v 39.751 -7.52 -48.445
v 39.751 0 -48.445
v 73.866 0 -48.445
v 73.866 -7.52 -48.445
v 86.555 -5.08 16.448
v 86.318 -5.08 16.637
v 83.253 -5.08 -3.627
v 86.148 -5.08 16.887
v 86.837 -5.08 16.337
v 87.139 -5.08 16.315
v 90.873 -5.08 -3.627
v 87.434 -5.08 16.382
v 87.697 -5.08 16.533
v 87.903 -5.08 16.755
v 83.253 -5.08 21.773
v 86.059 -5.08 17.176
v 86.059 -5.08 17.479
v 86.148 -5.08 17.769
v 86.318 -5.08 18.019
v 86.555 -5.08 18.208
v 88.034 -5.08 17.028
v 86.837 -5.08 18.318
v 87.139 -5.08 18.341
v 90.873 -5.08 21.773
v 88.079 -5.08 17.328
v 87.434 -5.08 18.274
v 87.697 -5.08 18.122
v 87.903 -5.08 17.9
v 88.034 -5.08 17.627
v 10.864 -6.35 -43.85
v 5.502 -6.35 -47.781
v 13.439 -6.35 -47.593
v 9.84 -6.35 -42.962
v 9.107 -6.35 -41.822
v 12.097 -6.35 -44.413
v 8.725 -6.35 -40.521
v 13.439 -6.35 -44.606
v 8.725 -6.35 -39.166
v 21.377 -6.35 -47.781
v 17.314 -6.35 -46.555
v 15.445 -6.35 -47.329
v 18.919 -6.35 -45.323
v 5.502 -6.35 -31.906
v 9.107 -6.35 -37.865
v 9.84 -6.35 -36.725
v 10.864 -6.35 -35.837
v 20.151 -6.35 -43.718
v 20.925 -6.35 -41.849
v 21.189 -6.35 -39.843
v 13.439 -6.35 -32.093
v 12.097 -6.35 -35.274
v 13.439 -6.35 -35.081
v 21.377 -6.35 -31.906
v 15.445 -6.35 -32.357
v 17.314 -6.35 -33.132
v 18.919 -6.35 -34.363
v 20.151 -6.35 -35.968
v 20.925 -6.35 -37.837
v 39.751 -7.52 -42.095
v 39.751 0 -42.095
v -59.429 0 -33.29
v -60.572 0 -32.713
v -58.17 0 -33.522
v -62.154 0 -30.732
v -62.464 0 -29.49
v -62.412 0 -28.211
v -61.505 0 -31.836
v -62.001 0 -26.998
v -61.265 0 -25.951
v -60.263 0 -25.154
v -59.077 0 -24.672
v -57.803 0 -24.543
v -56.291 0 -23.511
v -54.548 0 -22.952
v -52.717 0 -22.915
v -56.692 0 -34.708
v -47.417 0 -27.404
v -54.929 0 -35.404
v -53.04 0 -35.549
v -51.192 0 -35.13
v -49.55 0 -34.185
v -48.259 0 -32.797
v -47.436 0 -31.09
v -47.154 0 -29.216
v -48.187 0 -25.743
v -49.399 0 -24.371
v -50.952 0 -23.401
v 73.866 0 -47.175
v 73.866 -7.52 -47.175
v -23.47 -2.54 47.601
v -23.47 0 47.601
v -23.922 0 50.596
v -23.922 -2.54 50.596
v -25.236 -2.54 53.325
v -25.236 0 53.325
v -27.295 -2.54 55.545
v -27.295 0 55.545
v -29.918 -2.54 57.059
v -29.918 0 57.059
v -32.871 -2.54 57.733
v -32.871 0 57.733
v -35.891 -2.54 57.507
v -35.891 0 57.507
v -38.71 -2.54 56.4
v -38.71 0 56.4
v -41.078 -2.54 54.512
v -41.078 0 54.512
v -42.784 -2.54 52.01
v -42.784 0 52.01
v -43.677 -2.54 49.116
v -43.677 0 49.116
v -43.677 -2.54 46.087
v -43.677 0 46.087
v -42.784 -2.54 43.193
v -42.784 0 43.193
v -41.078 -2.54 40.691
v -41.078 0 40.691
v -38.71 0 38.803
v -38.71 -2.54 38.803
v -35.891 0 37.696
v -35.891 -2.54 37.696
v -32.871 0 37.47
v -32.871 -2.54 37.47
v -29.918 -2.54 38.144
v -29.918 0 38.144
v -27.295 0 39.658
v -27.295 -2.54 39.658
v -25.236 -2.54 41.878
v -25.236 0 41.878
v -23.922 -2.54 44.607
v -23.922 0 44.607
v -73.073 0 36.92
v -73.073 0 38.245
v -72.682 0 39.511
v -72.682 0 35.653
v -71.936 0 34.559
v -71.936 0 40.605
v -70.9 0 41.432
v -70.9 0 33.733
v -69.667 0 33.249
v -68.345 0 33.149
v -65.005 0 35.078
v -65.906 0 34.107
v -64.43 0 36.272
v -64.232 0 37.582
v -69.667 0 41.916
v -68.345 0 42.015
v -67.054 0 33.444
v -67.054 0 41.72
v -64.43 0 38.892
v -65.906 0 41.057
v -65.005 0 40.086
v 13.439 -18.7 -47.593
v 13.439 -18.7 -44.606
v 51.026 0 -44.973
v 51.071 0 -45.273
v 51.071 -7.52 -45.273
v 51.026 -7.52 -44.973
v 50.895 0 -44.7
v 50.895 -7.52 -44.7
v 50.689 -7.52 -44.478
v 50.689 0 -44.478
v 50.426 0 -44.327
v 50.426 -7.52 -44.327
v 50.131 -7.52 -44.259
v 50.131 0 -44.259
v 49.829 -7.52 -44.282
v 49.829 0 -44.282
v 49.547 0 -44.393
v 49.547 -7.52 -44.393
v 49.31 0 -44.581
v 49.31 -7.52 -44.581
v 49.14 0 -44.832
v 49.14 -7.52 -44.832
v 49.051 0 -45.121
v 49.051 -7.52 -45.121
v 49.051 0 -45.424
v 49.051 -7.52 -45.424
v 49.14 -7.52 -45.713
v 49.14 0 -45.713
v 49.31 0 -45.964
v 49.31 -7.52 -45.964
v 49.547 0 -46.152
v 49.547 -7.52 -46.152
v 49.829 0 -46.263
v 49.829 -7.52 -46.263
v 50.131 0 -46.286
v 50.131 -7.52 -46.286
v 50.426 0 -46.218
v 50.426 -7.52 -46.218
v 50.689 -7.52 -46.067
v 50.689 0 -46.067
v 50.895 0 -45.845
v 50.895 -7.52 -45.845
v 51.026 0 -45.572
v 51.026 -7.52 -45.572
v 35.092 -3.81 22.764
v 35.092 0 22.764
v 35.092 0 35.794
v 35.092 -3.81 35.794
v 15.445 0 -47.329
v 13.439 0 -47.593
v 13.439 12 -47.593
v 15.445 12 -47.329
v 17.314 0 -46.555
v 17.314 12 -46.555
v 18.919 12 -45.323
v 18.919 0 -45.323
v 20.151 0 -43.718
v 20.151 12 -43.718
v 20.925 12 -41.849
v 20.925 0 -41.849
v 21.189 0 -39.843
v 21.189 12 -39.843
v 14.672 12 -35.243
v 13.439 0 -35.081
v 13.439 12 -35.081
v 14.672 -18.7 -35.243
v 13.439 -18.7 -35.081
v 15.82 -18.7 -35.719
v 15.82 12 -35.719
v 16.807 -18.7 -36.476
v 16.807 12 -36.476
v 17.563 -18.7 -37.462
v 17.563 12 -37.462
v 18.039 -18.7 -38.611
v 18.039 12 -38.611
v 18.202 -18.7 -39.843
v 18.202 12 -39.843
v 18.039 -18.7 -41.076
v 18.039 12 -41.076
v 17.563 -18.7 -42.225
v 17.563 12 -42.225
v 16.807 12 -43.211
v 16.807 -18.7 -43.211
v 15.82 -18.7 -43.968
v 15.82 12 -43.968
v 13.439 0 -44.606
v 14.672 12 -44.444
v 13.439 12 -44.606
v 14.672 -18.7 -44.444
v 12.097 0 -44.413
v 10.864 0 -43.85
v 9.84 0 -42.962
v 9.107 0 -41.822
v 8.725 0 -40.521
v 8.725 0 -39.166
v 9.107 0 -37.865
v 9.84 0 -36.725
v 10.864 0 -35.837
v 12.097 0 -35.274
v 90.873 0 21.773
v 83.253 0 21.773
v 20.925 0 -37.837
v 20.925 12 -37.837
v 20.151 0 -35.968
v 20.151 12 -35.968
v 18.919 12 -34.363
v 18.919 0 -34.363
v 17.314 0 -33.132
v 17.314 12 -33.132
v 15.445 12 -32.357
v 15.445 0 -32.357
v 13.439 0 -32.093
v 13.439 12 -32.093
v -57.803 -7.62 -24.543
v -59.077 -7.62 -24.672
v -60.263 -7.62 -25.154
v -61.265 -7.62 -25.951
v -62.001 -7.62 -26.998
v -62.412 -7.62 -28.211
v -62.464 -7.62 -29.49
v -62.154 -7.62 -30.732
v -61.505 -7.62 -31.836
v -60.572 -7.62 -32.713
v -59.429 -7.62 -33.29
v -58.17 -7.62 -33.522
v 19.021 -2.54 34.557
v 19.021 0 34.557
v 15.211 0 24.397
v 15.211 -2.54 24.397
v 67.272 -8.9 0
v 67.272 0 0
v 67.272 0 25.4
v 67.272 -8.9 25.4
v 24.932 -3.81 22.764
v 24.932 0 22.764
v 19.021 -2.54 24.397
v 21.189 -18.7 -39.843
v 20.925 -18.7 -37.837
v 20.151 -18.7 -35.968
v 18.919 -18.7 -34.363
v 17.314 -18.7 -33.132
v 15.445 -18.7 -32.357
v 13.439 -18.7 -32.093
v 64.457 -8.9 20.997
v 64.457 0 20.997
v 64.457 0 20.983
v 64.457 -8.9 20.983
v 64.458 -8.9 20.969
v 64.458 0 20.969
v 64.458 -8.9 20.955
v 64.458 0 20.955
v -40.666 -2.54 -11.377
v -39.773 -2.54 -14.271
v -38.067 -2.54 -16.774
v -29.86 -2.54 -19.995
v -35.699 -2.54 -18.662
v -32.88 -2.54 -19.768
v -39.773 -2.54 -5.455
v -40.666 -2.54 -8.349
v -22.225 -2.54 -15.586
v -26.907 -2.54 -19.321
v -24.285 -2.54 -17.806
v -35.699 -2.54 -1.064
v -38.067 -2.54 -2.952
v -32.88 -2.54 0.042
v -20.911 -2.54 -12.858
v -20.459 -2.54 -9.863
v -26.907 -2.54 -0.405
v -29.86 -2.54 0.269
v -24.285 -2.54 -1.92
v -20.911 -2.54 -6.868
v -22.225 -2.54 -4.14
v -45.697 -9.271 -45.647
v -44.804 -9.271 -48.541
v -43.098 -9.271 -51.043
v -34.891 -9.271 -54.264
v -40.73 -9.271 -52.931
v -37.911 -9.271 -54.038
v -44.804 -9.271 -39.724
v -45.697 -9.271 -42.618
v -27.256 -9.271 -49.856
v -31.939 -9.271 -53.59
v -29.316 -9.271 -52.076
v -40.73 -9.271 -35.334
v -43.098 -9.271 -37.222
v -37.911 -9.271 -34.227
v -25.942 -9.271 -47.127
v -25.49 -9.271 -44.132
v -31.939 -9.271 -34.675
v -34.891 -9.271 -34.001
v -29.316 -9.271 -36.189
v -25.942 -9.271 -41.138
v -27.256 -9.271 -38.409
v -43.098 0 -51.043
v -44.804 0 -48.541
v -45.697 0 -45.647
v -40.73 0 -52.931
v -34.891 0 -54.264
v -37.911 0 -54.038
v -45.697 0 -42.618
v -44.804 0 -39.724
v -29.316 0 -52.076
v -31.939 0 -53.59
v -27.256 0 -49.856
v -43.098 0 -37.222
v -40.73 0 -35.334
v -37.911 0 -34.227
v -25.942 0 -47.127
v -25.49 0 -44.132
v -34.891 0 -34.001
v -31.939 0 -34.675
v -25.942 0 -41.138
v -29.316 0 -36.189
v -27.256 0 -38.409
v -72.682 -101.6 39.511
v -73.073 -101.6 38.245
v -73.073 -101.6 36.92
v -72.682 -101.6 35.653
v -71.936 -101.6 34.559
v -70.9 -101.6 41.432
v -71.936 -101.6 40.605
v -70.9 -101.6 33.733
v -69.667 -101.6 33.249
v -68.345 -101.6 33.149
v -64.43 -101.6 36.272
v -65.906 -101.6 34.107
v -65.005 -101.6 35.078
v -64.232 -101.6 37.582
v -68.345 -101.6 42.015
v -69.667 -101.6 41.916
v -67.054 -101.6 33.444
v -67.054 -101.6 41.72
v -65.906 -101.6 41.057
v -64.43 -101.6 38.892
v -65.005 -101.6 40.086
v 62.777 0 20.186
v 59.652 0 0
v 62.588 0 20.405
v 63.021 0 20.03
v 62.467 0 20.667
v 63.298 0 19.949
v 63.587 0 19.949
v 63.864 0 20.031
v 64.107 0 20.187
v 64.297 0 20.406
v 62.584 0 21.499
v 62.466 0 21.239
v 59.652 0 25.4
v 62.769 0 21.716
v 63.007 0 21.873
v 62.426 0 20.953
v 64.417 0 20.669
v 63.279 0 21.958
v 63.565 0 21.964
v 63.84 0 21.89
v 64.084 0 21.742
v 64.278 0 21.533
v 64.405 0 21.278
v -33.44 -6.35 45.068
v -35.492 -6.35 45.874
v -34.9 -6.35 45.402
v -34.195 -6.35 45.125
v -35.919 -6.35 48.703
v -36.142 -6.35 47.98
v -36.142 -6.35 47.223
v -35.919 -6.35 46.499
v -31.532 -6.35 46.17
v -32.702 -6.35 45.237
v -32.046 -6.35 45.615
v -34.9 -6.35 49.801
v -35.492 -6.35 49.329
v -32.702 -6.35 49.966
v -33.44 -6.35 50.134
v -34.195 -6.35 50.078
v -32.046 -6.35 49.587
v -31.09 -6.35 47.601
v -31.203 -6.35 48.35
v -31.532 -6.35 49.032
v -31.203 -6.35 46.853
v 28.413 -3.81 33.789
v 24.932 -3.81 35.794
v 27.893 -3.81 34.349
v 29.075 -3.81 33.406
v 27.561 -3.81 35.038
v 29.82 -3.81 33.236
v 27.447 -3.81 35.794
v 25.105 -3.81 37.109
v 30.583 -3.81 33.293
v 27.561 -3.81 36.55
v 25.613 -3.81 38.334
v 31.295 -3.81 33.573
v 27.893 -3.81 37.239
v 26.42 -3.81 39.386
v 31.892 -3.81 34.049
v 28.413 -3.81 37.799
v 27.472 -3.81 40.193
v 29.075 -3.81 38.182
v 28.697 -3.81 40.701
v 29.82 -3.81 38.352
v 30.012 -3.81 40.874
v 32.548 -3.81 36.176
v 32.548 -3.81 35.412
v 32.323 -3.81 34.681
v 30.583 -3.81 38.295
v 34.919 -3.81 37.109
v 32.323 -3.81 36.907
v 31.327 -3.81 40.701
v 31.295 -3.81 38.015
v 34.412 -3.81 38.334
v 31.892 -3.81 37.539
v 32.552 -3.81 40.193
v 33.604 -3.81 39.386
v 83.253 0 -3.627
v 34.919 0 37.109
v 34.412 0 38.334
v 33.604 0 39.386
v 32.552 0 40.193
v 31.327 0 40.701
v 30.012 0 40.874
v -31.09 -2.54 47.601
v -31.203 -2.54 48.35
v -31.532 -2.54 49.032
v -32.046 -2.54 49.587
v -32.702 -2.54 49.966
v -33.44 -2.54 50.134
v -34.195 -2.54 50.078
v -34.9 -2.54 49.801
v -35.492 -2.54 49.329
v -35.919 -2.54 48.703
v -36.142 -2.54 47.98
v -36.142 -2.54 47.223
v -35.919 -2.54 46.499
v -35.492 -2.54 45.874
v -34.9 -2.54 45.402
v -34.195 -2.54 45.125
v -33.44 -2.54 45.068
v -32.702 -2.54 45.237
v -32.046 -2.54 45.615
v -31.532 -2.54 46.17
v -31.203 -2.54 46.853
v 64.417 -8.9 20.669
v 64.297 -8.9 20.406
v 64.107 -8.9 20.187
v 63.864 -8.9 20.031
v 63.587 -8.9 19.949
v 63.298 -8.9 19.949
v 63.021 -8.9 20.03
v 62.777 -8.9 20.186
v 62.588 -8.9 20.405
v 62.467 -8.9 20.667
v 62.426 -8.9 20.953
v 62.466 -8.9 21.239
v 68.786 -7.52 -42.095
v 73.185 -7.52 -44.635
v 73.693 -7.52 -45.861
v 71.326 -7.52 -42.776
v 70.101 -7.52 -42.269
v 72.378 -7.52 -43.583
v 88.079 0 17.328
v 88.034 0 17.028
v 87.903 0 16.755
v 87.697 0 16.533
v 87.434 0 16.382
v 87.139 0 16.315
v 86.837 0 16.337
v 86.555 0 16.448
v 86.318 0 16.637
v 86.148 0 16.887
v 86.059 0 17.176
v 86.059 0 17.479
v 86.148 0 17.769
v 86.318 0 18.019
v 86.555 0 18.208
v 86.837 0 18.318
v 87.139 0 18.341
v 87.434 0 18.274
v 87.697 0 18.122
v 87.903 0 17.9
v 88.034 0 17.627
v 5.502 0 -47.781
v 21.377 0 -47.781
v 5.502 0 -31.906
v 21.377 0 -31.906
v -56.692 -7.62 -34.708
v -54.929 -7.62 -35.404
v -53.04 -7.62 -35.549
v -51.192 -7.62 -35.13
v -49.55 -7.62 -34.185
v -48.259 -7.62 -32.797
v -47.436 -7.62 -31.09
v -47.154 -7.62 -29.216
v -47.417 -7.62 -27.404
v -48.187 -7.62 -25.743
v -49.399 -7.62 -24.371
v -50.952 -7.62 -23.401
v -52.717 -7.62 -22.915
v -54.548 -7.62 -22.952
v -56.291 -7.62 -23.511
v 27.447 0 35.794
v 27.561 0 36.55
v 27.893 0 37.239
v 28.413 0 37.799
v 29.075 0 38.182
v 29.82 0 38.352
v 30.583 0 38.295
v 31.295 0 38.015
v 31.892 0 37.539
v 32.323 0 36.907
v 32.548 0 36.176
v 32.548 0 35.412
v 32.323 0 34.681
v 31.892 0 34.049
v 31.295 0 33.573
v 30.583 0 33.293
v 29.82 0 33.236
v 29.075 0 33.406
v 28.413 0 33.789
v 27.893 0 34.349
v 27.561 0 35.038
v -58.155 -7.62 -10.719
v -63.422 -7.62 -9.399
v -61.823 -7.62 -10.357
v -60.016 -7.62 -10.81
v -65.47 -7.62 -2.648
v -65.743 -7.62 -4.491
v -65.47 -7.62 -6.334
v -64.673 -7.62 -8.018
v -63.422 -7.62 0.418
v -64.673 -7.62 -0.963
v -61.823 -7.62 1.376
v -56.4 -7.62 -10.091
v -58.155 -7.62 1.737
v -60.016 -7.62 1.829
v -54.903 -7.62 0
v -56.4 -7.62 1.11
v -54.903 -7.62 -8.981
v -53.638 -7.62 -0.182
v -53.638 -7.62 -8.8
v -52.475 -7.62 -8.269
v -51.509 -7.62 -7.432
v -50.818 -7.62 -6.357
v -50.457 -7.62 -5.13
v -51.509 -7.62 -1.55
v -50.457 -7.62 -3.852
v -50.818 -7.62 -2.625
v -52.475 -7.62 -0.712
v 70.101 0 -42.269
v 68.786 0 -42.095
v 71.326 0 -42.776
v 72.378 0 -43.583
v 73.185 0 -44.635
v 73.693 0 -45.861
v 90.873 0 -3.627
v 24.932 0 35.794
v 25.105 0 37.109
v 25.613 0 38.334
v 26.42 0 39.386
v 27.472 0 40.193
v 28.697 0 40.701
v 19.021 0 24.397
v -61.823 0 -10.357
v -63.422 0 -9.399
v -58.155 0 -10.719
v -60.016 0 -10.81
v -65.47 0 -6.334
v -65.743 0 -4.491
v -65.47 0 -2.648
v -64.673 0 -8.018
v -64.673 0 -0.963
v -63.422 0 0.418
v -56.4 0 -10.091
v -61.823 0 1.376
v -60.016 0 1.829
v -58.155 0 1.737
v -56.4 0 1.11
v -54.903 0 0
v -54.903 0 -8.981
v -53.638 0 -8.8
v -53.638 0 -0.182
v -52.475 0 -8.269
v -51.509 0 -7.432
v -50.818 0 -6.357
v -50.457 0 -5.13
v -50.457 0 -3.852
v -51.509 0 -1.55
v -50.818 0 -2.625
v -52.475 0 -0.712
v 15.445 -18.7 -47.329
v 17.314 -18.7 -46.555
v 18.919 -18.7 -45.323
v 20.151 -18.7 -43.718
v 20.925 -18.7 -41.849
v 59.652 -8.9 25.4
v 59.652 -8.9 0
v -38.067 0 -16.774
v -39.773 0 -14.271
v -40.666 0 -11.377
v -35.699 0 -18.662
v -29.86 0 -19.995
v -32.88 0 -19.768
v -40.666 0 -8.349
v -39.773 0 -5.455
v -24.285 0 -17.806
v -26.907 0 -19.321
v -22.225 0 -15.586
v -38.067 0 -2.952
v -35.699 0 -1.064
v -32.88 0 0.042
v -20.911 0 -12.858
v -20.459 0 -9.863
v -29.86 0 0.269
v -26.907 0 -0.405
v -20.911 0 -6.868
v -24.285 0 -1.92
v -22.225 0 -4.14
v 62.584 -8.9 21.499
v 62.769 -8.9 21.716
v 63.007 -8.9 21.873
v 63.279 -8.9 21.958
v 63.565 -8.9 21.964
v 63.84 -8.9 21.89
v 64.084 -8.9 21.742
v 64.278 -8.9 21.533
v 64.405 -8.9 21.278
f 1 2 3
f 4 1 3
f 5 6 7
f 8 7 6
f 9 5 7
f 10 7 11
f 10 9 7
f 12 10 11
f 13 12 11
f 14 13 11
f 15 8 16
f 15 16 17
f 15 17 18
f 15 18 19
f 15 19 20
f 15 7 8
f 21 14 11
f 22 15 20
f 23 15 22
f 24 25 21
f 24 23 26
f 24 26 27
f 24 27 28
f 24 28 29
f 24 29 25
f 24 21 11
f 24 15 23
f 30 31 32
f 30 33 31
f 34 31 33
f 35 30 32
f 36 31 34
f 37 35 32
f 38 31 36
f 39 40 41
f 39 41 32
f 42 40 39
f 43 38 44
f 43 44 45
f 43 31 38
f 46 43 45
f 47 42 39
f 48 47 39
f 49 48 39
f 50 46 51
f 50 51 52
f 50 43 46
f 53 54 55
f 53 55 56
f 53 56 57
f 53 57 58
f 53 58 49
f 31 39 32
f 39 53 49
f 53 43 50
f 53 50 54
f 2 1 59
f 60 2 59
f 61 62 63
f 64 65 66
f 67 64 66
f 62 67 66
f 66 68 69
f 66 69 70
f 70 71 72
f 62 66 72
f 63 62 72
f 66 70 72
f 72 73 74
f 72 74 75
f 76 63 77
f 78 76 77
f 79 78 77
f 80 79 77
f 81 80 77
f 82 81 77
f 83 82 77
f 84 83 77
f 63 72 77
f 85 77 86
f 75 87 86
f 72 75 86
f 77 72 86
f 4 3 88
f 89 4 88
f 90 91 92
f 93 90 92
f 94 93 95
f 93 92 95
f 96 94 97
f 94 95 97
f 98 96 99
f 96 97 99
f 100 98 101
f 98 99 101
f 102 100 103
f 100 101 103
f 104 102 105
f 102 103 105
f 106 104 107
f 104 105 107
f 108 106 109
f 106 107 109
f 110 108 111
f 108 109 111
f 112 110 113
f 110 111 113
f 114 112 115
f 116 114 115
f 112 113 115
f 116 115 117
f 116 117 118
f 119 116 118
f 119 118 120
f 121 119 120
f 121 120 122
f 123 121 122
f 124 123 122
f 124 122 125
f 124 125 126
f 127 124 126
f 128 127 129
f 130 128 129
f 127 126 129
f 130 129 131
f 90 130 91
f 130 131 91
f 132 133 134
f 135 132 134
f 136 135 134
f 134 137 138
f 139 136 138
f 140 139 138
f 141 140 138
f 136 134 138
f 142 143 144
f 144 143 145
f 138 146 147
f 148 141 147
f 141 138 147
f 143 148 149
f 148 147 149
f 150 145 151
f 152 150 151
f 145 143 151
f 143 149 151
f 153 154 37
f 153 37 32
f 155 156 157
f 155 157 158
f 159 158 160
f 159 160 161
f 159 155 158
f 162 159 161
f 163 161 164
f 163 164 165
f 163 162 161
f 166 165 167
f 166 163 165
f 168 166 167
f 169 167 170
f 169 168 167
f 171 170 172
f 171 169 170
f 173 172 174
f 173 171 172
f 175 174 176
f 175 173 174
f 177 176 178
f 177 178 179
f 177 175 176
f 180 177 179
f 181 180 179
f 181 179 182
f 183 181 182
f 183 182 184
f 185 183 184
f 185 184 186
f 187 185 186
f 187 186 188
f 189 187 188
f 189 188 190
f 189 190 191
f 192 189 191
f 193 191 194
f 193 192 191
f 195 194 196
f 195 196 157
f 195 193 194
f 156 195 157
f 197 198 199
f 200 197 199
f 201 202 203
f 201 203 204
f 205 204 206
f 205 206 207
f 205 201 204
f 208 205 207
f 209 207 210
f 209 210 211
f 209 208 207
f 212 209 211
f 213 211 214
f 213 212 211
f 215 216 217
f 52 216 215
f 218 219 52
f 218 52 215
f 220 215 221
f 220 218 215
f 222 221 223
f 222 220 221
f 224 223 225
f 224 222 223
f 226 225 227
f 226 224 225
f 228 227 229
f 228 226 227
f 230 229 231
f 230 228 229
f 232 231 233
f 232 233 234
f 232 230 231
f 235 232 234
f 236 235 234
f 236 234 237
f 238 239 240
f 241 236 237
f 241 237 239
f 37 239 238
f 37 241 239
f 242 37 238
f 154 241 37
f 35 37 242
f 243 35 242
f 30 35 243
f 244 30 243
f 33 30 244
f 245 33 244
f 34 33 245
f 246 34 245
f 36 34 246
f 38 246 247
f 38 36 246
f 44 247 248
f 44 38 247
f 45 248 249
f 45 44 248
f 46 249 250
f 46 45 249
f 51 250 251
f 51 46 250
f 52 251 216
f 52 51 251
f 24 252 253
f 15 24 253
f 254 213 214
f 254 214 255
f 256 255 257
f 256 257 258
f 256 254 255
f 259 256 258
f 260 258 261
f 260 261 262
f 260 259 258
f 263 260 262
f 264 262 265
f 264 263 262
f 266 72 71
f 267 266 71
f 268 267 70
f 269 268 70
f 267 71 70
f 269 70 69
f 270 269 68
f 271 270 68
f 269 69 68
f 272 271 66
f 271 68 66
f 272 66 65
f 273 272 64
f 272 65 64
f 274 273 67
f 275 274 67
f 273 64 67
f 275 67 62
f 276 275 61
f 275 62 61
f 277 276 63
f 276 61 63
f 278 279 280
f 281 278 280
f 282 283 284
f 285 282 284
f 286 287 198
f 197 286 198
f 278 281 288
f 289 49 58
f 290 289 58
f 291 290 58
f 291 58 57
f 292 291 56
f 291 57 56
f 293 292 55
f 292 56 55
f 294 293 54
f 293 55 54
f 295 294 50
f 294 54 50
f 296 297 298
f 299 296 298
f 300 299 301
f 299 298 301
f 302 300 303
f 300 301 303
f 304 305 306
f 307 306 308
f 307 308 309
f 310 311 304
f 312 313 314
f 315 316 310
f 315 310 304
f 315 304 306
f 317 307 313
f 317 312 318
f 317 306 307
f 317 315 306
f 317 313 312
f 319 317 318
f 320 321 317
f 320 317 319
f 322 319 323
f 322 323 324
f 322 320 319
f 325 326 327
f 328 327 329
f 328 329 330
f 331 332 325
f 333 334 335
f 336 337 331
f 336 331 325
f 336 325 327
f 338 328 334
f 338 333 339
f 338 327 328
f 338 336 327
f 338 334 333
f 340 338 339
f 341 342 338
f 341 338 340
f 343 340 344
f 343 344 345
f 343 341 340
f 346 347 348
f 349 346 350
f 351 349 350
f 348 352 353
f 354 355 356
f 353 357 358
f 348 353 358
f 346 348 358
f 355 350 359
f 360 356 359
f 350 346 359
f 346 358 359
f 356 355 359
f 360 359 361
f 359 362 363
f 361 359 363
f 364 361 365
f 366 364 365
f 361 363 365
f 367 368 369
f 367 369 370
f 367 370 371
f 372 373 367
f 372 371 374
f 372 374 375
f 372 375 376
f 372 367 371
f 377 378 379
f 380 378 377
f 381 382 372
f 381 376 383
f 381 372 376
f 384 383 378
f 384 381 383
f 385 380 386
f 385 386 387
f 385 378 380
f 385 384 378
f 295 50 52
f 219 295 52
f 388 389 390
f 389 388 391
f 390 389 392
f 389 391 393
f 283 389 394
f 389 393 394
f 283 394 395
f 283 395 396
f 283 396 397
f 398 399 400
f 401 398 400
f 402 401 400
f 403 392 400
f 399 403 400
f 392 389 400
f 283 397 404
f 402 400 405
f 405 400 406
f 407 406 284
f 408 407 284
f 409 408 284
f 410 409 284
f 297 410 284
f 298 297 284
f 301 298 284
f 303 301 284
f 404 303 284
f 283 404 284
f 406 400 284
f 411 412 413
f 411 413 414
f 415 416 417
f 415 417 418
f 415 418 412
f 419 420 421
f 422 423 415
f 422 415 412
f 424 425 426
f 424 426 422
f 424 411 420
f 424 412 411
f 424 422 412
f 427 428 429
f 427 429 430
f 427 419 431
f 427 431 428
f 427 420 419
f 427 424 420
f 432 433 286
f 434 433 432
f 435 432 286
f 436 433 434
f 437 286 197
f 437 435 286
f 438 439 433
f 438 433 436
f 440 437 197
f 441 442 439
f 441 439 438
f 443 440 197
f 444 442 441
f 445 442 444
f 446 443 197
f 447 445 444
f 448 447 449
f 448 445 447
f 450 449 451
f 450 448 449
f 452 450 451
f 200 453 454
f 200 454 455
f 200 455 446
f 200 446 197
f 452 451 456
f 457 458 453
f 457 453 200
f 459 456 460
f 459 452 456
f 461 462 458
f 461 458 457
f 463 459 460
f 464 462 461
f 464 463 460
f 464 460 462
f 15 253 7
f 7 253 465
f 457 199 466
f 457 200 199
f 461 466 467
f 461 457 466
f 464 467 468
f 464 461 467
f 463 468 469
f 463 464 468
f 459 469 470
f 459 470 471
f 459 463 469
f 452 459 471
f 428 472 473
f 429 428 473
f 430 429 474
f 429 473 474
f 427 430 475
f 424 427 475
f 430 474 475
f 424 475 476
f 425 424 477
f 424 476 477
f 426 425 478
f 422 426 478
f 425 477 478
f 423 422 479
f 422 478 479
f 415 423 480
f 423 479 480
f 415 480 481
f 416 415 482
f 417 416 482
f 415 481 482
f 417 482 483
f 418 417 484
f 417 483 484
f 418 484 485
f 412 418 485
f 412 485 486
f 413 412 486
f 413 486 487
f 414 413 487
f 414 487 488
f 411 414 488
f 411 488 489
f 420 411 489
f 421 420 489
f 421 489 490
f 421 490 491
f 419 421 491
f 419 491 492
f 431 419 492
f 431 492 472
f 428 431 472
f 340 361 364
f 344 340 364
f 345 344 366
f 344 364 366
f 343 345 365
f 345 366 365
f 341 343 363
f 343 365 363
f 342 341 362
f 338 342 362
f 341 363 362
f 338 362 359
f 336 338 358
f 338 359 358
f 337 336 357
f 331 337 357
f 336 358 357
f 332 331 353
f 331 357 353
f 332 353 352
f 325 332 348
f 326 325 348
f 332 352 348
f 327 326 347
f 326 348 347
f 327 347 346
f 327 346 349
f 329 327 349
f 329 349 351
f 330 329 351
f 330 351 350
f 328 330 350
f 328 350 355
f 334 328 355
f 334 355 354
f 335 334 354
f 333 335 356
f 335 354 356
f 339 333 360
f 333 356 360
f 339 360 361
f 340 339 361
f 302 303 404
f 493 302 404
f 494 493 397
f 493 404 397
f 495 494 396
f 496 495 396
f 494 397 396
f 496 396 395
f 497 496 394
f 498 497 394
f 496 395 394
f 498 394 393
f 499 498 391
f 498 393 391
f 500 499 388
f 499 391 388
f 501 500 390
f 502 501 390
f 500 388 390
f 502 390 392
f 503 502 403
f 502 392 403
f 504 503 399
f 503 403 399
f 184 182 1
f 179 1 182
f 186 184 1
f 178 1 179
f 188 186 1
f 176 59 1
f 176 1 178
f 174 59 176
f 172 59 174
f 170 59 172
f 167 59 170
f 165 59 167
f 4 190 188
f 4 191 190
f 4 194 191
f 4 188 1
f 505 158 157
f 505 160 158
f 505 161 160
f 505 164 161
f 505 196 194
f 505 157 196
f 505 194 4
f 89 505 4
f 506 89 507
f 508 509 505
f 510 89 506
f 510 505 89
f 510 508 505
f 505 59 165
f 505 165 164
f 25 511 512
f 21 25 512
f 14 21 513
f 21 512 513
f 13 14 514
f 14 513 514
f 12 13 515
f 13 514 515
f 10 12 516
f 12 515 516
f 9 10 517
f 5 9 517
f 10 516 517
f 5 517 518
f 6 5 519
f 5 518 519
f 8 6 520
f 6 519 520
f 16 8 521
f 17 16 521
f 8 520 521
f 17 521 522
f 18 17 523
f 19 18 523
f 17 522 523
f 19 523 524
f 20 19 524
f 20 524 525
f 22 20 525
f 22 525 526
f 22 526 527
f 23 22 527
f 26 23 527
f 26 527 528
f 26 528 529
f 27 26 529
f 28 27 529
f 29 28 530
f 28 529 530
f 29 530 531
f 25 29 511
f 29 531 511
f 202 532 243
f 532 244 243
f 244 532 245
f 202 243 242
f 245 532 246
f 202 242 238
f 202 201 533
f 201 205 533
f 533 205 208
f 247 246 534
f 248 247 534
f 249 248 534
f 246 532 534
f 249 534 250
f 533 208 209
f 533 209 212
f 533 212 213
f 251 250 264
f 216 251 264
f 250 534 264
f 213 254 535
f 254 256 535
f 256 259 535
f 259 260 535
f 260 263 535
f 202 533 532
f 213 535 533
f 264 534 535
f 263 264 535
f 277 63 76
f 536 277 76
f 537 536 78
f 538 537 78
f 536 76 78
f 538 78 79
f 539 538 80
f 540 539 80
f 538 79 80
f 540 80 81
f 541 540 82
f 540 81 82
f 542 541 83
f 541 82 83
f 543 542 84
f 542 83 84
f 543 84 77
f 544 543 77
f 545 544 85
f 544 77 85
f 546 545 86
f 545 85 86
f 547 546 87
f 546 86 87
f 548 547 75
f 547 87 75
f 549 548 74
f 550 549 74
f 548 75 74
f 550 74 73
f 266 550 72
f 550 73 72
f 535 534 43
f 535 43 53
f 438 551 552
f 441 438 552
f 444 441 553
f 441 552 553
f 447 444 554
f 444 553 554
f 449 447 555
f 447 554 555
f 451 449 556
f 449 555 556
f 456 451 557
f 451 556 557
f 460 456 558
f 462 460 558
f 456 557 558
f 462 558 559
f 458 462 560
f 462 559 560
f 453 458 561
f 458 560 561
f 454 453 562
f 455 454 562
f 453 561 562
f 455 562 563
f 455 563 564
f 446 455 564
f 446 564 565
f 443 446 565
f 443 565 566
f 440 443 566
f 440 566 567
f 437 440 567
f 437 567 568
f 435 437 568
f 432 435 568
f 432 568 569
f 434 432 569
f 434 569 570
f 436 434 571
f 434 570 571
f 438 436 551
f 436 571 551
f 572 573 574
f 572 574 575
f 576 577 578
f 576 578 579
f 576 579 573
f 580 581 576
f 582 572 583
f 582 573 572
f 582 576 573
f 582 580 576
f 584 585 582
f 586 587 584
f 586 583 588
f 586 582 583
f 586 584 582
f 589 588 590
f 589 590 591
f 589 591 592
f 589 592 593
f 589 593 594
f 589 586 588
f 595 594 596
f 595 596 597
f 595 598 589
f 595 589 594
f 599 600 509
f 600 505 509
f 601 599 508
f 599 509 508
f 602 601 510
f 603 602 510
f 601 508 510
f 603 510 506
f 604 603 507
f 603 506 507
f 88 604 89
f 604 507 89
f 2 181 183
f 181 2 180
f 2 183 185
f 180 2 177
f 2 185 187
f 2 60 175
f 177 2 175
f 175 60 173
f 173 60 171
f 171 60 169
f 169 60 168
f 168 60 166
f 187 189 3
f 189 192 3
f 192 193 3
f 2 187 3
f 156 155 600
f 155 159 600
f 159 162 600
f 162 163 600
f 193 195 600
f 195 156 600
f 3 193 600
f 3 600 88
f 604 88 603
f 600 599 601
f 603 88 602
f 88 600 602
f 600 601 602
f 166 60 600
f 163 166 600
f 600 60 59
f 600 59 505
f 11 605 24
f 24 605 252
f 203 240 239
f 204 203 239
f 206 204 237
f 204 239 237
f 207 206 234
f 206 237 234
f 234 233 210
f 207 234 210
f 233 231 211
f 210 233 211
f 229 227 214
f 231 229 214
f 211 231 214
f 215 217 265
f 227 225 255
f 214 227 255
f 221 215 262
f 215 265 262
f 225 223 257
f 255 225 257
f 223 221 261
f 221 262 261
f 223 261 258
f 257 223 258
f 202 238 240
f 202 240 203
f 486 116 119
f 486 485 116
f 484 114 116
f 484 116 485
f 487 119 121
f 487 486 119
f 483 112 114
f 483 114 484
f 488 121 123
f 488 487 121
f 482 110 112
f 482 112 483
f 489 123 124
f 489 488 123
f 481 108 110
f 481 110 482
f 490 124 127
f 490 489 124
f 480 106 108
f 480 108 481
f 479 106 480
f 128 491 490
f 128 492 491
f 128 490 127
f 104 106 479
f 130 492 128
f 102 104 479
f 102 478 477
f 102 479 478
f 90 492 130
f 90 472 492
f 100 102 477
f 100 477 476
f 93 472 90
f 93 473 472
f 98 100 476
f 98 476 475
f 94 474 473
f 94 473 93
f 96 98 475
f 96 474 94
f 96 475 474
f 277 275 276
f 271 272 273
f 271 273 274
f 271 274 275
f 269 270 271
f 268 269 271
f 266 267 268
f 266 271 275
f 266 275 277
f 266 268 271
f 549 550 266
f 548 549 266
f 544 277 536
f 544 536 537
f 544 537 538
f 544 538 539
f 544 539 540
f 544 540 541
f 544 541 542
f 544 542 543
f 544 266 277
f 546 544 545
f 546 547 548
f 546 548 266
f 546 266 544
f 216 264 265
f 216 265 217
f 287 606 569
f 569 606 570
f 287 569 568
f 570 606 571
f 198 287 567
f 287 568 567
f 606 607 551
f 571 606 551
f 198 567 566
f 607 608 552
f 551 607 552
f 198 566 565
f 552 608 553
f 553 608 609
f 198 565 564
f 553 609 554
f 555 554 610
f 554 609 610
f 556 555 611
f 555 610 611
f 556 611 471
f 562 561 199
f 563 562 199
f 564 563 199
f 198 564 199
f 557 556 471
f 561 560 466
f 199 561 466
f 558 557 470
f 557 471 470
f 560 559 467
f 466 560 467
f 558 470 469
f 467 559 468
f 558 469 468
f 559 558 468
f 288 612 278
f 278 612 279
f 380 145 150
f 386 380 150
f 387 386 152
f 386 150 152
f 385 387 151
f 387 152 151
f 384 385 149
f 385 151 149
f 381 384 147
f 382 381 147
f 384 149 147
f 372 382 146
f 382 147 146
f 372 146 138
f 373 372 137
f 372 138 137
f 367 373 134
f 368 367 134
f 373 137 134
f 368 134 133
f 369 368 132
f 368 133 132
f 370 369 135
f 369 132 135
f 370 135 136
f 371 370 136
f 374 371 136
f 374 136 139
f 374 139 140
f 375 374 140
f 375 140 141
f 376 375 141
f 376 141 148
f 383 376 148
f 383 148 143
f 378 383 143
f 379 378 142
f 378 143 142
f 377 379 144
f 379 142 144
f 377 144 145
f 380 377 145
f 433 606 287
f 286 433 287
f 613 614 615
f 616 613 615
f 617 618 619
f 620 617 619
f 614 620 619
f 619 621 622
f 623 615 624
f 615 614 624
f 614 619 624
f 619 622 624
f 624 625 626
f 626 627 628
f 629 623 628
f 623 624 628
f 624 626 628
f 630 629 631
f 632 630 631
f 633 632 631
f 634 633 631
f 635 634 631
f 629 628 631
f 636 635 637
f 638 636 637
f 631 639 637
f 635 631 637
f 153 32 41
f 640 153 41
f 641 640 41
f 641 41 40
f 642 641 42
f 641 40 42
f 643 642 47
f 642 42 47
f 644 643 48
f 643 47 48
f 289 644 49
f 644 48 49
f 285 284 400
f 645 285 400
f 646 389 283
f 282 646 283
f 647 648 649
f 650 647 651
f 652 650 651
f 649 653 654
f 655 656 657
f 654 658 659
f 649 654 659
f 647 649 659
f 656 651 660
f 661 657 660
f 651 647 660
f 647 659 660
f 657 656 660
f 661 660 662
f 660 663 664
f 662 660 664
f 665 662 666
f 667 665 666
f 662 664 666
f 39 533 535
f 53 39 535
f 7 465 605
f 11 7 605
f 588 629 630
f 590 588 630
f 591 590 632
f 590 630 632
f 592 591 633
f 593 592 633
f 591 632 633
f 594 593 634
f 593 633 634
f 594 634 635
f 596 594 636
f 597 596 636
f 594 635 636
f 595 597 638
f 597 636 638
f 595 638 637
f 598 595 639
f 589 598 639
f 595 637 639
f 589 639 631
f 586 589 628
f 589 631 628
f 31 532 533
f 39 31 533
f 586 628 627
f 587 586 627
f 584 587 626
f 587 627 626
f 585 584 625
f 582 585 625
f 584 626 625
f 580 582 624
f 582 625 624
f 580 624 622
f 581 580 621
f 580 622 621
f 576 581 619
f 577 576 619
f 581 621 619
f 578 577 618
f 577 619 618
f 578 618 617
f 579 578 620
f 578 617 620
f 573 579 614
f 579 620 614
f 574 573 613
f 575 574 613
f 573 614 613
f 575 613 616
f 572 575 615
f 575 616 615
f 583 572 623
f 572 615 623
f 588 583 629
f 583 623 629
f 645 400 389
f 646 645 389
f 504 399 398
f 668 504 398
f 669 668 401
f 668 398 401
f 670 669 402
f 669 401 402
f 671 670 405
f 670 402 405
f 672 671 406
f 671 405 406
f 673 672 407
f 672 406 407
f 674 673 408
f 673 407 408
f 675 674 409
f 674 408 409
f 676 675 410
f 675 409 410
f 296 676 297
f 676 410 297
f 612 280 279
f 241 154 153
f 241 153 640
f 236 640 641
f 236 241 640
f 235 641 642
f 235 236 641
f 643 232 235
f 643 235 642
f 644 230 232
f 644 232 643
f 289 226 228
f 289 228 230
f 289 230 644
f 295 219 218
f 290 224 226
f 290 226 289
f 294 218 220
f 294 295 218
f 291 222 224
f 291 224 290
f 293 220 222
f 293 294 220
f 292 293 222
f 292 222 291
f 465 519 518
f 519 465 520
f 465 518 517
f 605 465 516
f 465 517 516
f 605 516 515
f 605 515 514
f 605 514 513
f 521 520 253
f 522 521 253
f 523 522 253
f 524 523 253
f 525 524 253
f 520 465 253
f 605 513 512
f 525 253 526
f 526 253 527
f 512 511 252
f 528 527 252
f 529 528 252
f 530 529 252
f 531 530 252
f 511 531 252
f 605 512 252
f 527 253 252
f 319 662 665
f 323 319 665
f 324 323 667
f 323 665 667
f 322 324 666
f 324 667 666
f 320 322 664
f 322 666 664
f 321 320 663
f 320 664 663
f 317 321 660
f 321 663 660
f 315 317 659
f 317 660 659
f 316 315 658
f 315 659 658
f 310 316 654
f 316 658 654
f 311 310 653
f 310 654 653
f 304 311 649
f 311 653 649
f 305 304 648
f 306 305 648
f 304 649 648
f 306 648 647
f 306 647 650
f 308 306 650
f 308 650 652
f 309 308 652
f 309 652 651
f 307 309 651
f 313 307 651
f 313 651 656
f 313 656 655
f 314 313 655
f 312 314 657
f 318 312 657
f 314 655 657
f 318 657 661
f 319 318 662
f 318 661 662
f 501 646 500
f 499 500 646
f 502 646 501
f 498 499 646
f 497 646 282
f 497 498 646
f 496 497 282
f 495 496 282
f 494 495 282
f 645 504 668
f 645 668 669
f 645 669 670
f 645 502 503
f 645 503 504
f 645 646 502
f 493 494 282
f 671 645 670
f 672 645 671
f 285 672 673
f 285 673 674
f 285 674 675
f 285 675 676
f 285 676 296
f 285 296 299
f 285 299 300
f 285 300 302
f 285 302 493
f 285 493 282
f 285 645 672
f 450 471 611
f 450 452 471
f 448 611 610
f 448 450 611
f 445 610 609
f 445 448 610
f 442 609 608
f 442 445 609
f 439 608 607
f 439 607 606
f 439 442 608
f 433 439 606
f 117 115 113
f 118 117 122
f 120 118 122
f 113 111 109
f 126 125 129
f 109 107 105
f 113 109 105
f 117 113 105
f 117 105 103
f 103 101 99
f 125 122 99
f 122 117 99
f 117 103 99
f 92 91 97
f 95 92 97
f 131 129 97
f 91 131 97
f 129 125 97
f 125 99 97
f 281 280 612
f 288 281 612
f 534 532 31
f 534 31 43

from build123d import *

# Parameters (mm, degrees)
F0_W           = 15.875
F0_H           = 15.875
F1_DEPTH       = 6.35
F0_W_2         = 34.115
F0_H_2         = 6.35
F0_R           = 1.016
F2_DEPTH       = 7.52
F3_DEPTH       = 7.62
F0_R_2         = 10.16
F4_DEPTH       = 9.271
F5_R           = 5.08
F6_DEPTH       = 2.54
F0_R_3         = 2.54
F7_DEPTH       = 6.35
F8_DEPTH       = 2.54
F9_DEPTH       = 3.81
F10_DEPTH      = 2.54
F11_R          = 5.07999
F12_DEPTH      = 7.62
F13_DEPTH      = 5.08
F14_DEPTH      = 8.9
F0_R_4         = 4.445
F15_DEPTH      = 101.6
F16_DEPTH      = 6.35
F17_DEPTH      = 18.7
F17_DEPTH_BACK = 12


# Not quite as in the source:
# - a fillet or chamfer is up to 0.001 mm smaller than in the source, because OpenCascade refuses the exact size
# - a length typed as a fraction of an inch, garbled in the dataset ("3 / 203.2 mm" for 3/8 in), is restored


with BuildPart() as f1:
    # F0 (on Front) → F1 (new body)
    with BuildSketch(Plane.XZ):
        with Locations((13.4390089661, -39.8432931602)):
            Rectangle(F0_W, F0_H)
        with BuildLine():
            ThreePointArc((13.4390089661, -47.5932931602), (5.6890089661, -39.8432931602), (13.4390089661, -32.0932931602))
            ThreePointArc((13.4390089661, -32.0932931602), (18.9190865203, -34.363215606), (21.1890089661, -39.8432931602))
            ThreePointArc((21.1890089661, -39.8432931602), (18.9190865203, -45.3233707144), (13.4390089661, -47.5932931602))
        make_face(mode=Mode.SUBTRACT)
    extrude(amount=F1_DEPTH)

    # F0 (on Front) → F16 (join)
    with BuildSketch(Plane.XZ):
        with BuildLine():
            ThreePointArc((13.4390089661, -44.6057931602), (8.6765089661, -39.8432931602), (13.4390089661, -35.0807931602))
            Line((13.4390089661, -35.0807931602), (13.4390089661, -32.0932931602))
            ThreePointArc((13.4390089661, -32.0932931602), (5.6890089661, -39.8432931602), (13.4390089661, -47.5932931602))
            Line((13.4390089661, -47.5932931602), (13.4390089661, -44.6057931602))
        make_face()
    extrude(amount=F16_DEPTH)

    # F0 (on Front) → F17 (join, two sides)
    with BuildSketch(Plane.XZ) as f17_sk:
        with BuildLine():
            ThreePointArc((13.4390089661, -35.0807931602), (16.8066050115, -36.4756971148), (18.2015089661, -39.8432931602))
            ThreePointArc((18.2015089661, -39.8432931602), (16.8066050115, -43.2108892056), (13.4390089661, -44.6057931602))
            Line((13.4390089661, -44.6057931602), (13.4390089661, -47.5932931602))
            ThreePointArc((13.4390089661, -47.5932931602), (18.9190865203, -45.3233707144), (21.1890089661, -39.8432931602))
            ThreePointArc((21.1890089661, -39.8432931602), (18.9190865203, -34.363215606), (13.4390089661, -32.0932931602))
            Line((13.4390089661, -32.0932931602), (13.4390089661, -35.0807931602))
        make_face()
    extrude(amount=F17_DEPTH)
    extrude(f17_sk.sketch, amount=-F17_DEPTH_BACK)


with BuildPart() as f2:
    # F0 (on Front) → F2 (new body)
    with BuildSketch(Plane.XZ):
        with Locations((56.8083405149, -45.2704743564)):
            Rectangle(F0_W_2, F0_H_2)
        with Locations((50.0551967038, -45.2725063564)):
            Circle(F0_R, mode=Mode.SUBTRACT)
    extrude(amount=F2_DEPTH)

    # F5
    f5_edges = [f2.edges().sort_by_distance(p)[0] for p in [
        (73.865841, -3.76, -42.095474),
    ]]
    fillet(f5_edges, radius=F5_R)


with BuildPart() as f3:
    # F0 (on Front) → F3 (new body)
    with BuildSketch(Plane.XZ):
        with BuildLine():
            ThreePointArc((-58.1704086232, -33.5221318855), (-51.1918348413, -35.1302957719), (-47.1535133362, -29.2160212994))
            ThreePointArc((-47.1535133362, -29.2160212994), (-50.9520649509, -23.4011600682), (-57.8031546393, -24.5431651423))
            ThreePointArc((-57.8031546393, -24.5431651423), (-59.8482084076, -28.9565132058), (-58.1704086232, -33.5221318855))
        make_face()
        with BuildLine():
            ThreePointArc((-58.1704086232, -33.5221318855), (-59.8482084076, -28.9565132058), (-57.8031546393, -24.5431651423))
            ThreePointArc((-57.8031546393, -24.5431651423), (-62.483722892, -28.8487164825), (-58.1704086232, -33.5221318855))
        make_face()
    extrude(amount=F3_DEPTH)


with BuildPart() as f4:
    # F0 (on Front) → F4 (new body)
    with BuildSketch(Plane.XZ):
        with Locations((-35.6504768133, -44.1323518753)):
            Circle(F0_R_2)
    extrude(amount=F4_DEPTH)


with BuildPart() as f6:
    # F0 (on Front) → F6 (new body)
    with BuildSketch(Plane.XZ):
        with Locations((-30.6192673743, -9.8629677668)):
            Circle(F0_R_2)
    extrude(amount=F6_DEPTH)


with BuildPart() as f7:
    # F0 (on Front) → F7 (new body)
    with BuildSketch(Plane.XZ):
        with Locations((-33.6301475763, 47.6013273001)):
            Circle(F0_R_3)
    extrude(amount=F7_DEPTH)

    # F0 (on Front) → F8 (join)
    with BuildSketch(Plane.XZ):
        with Locations((-33.6301475763, 47.6013273001)):
            Circle(F0_R_2)
        with Locations((-33.6301475763, 47.6013273001)):
            Circle(F0_R_3, mode=Mode.SUBTRACT)
    extrude(amount=F8_DEPTH)


with BuildPart() as f9:
    # F0 (on Front) → F9 (new body)
    with BuildSketch(Plane.XZ):
        with BuildLine():
            Line((27.4471032315, 35.7939480323), (24.9321032315, 35.7939480323))
            Line((24.9321032315, 35.7939480323), (24.9321032315, 22.7639480323))
            Line((24.9321032315, 22.7639480323), (35.0921032315, 22.7639480323))
            Line((35.0921032315, 22.7639480323), (35.0921032315, 35.7939480323))
            Line((35.0921032315, 35.7939480323), (32.5771032315, 35.7939480323))
            ThreePointArc((32.5771032315, 35.7939480323), (30.0121032315, 33.2289480323), (27.4471032315, 35.7939480323))
        make_face()
        with BuildLine():
            Line((35.0921032315, 40.8739480323), (24.9321032315, 40.8739480323))
            Line((24.9321032315, 40.8739480323), (24.9321032315, 35.7939480323))
            Line((24.9321032315, 35.7939480323), (27.4471032315, 35.7939480323))
            ThreePointArc((27.4471032315, 35.7939480323), (30.0121032315, 38.3589480323), (32.5771032315, 35.7939480323))
            Line((32.5771032315, 35.7939480323), (35.0921032315, 35.7939480323))
            Line((35.0921032315, 35.7939480323), (35.0921032315, 40.8739480323))
        make_face()
    extrude(amount=F9_DEPTH)

    # F11 (radius 5.08 in the source; OpenCascade refuses exactly that, so slightly less here)
    f11_edges = [f9.edges().sort_by_distance(p)[0] for p in [
        (35.092103, -1.905, 40.873948),
        (24.932103, -1.905, 40.873948),
    ]]
    fillet(f11_edges, radius=F11_R)


with BuildPart() as f10:
    # F0 (on Front) → F10 (new body)
    with BuildSketch(Plane.XZ):
        Polygon((19.0205297893, 24.3973601609), (19.0205297893, 34.5573601609), (15.2105297893, 24.3973601609), align=None)
    extrude(amount=F10_DEPTH)


with BuildPart() as f12:
    # F0 (on Front) → F12 (new body)
    with BuildSketch(Plane.XZ):
        with BuildLine():
            ThreePointArc((-54.9034981155, -8.9814396879), (-53.5265594418, -6.9211462608), (-53.0430343145, -4.490719844))
            ThreePointArc((-53.0430343145, -4.490719844), (-53.5265594418, -2.0602934271), (-54.9034981155, 0))
            ThreePointArc((-54.9034981155, 0), (-65.7430343145, -4.490719844), (-54.9034981155, -8.9814396879))
        make_face()
        with BuildLine():
            ThreePointArc((-54.9034981155, 0), (-53.5265594418, -2.0602934271), (-53.0430343145, -4.490719844))
            ThreePointArc((-53.0430343145, -4.490719844), (-53.5265594418, -6.9211462608), (-54.9034981155, -8.9814396879))
            ThreePointArc((-54.9034981155, -8.9814396879), (-50.4115943145, -4.490719844), (-54.9034981155, 0))
        make_face()
    extrude(amount=F12_DEPTH)


with BuildPart() as f13:
    # F0 (on Front) → F13 (new body)
    with BuildSketch(Plane.XZ):
        with BuildLine():
            Line((90.8731772517, 21.7727785543), (83.2531772517, 21.7727785543))
            Line((83.2531772517, 21.7727785543), (83.2531772517, 17.3277785543))
            Line((83.2531772517, 17.3277785543), (86.0471772517, 17.3277785543))
            ThreePointArc((86.0471772517, 17.3277785543), (87.0631772517, 18.3437785543), (88.0791772517, 17.3277785543))
            Line((88.0791772517, 17.3277785543), (90.8731772517, 17.3277785543))
            Line((90.8731772517, 17.3277785543), (90.8731772517, 21.7727785543))
        make_face()
        with BuildLine():
            Line((86.0471772517, 17.3277785543), (83.2531772517, 17.3277785543))
            Line((83.2531772517, 17.3277785543), (83.2531772517, -3.6272214457))
            Line((83.2531772517, -3.6272214457), (90.8731772517, -3.6272214457))
            Line((90.8731772517, -3.6272214457), (90.8731772517, 17.3277785543))
            Line((90.8731772517, 17.3277785543), (88.0791772517, 17.3277785543))
            ThreePointArc((88.0791772517, 17.3277785543), (87.0631772517, 16.3117785543), (86.0471772517, 17.3277785543))
        make_face()
    extrude(amount=F13_DEPTH)


with BuildPart() as f14:
    # F0 (on Front) → F14 (new body)
    with BuildSketch(Plane.XZ):
        with BuildLine():
            Line((67.2715870141, 25.4), (59.6515870141, 25.4))
            Line((59.6515870141, 25.4), (59.6515870141, 21.2394388122))
            Line((59.6515870141, 21.2394388122), (62.4663369513, 21.2394388122))
            ThreePointArc((62.4663369513, 21.2394388122), (63.5645068324, 21.9635517753), (64.456837077, 20.9970822176))
            Line((64.456837077, 20.9970822176), (67.2715870141, 20.9970822176))
            Line((67.2715870141, 20.9970822176), (67.2715870141, 25.4))
        make_face()
        with BuildLine():
            Line((62.4663369513, 21.2394388122), (59.6515870141, 21.2394388122))
            Line((59.6515870141, 21.2394388122), (59.6515870141, 0))
            Line((59.6515870141, 0), (67.2715870141, 0))
            Line((67.2715870141, 0), (67.2715870141, 20.9970822176))
            Line((67.2715870141, 20.9970822176), (64.456837077, 20.9970822176))
            ThreePointArc((64.456837077, 20.9970822176), (64.4574909684, 20.9760456244), (64.4577089634, 20.955))
            ThreePointArc((64.4577089634, 20.955), (63.2980461018, 19.9492082809), (62.4663369513, 21.2394388122))
        make_face()
    extrude(amount=F14_DEPTH)


with BuildPart() as f15:
    # F0 (on Front) → F15 (new body)
    with BuildSketch(Plane.XZ):
        with Locations((-68.6774551868, 37.5820547342)):
            Circle(F0_R_4)
    extrude(amount=F15_DEPTH)


solid = Compound([f1.part, f2.part, f3.part, f4.part, f6.part, f7.part, f9.part, f10.part, f12.part, f13.part, f14.part, f15.part])
